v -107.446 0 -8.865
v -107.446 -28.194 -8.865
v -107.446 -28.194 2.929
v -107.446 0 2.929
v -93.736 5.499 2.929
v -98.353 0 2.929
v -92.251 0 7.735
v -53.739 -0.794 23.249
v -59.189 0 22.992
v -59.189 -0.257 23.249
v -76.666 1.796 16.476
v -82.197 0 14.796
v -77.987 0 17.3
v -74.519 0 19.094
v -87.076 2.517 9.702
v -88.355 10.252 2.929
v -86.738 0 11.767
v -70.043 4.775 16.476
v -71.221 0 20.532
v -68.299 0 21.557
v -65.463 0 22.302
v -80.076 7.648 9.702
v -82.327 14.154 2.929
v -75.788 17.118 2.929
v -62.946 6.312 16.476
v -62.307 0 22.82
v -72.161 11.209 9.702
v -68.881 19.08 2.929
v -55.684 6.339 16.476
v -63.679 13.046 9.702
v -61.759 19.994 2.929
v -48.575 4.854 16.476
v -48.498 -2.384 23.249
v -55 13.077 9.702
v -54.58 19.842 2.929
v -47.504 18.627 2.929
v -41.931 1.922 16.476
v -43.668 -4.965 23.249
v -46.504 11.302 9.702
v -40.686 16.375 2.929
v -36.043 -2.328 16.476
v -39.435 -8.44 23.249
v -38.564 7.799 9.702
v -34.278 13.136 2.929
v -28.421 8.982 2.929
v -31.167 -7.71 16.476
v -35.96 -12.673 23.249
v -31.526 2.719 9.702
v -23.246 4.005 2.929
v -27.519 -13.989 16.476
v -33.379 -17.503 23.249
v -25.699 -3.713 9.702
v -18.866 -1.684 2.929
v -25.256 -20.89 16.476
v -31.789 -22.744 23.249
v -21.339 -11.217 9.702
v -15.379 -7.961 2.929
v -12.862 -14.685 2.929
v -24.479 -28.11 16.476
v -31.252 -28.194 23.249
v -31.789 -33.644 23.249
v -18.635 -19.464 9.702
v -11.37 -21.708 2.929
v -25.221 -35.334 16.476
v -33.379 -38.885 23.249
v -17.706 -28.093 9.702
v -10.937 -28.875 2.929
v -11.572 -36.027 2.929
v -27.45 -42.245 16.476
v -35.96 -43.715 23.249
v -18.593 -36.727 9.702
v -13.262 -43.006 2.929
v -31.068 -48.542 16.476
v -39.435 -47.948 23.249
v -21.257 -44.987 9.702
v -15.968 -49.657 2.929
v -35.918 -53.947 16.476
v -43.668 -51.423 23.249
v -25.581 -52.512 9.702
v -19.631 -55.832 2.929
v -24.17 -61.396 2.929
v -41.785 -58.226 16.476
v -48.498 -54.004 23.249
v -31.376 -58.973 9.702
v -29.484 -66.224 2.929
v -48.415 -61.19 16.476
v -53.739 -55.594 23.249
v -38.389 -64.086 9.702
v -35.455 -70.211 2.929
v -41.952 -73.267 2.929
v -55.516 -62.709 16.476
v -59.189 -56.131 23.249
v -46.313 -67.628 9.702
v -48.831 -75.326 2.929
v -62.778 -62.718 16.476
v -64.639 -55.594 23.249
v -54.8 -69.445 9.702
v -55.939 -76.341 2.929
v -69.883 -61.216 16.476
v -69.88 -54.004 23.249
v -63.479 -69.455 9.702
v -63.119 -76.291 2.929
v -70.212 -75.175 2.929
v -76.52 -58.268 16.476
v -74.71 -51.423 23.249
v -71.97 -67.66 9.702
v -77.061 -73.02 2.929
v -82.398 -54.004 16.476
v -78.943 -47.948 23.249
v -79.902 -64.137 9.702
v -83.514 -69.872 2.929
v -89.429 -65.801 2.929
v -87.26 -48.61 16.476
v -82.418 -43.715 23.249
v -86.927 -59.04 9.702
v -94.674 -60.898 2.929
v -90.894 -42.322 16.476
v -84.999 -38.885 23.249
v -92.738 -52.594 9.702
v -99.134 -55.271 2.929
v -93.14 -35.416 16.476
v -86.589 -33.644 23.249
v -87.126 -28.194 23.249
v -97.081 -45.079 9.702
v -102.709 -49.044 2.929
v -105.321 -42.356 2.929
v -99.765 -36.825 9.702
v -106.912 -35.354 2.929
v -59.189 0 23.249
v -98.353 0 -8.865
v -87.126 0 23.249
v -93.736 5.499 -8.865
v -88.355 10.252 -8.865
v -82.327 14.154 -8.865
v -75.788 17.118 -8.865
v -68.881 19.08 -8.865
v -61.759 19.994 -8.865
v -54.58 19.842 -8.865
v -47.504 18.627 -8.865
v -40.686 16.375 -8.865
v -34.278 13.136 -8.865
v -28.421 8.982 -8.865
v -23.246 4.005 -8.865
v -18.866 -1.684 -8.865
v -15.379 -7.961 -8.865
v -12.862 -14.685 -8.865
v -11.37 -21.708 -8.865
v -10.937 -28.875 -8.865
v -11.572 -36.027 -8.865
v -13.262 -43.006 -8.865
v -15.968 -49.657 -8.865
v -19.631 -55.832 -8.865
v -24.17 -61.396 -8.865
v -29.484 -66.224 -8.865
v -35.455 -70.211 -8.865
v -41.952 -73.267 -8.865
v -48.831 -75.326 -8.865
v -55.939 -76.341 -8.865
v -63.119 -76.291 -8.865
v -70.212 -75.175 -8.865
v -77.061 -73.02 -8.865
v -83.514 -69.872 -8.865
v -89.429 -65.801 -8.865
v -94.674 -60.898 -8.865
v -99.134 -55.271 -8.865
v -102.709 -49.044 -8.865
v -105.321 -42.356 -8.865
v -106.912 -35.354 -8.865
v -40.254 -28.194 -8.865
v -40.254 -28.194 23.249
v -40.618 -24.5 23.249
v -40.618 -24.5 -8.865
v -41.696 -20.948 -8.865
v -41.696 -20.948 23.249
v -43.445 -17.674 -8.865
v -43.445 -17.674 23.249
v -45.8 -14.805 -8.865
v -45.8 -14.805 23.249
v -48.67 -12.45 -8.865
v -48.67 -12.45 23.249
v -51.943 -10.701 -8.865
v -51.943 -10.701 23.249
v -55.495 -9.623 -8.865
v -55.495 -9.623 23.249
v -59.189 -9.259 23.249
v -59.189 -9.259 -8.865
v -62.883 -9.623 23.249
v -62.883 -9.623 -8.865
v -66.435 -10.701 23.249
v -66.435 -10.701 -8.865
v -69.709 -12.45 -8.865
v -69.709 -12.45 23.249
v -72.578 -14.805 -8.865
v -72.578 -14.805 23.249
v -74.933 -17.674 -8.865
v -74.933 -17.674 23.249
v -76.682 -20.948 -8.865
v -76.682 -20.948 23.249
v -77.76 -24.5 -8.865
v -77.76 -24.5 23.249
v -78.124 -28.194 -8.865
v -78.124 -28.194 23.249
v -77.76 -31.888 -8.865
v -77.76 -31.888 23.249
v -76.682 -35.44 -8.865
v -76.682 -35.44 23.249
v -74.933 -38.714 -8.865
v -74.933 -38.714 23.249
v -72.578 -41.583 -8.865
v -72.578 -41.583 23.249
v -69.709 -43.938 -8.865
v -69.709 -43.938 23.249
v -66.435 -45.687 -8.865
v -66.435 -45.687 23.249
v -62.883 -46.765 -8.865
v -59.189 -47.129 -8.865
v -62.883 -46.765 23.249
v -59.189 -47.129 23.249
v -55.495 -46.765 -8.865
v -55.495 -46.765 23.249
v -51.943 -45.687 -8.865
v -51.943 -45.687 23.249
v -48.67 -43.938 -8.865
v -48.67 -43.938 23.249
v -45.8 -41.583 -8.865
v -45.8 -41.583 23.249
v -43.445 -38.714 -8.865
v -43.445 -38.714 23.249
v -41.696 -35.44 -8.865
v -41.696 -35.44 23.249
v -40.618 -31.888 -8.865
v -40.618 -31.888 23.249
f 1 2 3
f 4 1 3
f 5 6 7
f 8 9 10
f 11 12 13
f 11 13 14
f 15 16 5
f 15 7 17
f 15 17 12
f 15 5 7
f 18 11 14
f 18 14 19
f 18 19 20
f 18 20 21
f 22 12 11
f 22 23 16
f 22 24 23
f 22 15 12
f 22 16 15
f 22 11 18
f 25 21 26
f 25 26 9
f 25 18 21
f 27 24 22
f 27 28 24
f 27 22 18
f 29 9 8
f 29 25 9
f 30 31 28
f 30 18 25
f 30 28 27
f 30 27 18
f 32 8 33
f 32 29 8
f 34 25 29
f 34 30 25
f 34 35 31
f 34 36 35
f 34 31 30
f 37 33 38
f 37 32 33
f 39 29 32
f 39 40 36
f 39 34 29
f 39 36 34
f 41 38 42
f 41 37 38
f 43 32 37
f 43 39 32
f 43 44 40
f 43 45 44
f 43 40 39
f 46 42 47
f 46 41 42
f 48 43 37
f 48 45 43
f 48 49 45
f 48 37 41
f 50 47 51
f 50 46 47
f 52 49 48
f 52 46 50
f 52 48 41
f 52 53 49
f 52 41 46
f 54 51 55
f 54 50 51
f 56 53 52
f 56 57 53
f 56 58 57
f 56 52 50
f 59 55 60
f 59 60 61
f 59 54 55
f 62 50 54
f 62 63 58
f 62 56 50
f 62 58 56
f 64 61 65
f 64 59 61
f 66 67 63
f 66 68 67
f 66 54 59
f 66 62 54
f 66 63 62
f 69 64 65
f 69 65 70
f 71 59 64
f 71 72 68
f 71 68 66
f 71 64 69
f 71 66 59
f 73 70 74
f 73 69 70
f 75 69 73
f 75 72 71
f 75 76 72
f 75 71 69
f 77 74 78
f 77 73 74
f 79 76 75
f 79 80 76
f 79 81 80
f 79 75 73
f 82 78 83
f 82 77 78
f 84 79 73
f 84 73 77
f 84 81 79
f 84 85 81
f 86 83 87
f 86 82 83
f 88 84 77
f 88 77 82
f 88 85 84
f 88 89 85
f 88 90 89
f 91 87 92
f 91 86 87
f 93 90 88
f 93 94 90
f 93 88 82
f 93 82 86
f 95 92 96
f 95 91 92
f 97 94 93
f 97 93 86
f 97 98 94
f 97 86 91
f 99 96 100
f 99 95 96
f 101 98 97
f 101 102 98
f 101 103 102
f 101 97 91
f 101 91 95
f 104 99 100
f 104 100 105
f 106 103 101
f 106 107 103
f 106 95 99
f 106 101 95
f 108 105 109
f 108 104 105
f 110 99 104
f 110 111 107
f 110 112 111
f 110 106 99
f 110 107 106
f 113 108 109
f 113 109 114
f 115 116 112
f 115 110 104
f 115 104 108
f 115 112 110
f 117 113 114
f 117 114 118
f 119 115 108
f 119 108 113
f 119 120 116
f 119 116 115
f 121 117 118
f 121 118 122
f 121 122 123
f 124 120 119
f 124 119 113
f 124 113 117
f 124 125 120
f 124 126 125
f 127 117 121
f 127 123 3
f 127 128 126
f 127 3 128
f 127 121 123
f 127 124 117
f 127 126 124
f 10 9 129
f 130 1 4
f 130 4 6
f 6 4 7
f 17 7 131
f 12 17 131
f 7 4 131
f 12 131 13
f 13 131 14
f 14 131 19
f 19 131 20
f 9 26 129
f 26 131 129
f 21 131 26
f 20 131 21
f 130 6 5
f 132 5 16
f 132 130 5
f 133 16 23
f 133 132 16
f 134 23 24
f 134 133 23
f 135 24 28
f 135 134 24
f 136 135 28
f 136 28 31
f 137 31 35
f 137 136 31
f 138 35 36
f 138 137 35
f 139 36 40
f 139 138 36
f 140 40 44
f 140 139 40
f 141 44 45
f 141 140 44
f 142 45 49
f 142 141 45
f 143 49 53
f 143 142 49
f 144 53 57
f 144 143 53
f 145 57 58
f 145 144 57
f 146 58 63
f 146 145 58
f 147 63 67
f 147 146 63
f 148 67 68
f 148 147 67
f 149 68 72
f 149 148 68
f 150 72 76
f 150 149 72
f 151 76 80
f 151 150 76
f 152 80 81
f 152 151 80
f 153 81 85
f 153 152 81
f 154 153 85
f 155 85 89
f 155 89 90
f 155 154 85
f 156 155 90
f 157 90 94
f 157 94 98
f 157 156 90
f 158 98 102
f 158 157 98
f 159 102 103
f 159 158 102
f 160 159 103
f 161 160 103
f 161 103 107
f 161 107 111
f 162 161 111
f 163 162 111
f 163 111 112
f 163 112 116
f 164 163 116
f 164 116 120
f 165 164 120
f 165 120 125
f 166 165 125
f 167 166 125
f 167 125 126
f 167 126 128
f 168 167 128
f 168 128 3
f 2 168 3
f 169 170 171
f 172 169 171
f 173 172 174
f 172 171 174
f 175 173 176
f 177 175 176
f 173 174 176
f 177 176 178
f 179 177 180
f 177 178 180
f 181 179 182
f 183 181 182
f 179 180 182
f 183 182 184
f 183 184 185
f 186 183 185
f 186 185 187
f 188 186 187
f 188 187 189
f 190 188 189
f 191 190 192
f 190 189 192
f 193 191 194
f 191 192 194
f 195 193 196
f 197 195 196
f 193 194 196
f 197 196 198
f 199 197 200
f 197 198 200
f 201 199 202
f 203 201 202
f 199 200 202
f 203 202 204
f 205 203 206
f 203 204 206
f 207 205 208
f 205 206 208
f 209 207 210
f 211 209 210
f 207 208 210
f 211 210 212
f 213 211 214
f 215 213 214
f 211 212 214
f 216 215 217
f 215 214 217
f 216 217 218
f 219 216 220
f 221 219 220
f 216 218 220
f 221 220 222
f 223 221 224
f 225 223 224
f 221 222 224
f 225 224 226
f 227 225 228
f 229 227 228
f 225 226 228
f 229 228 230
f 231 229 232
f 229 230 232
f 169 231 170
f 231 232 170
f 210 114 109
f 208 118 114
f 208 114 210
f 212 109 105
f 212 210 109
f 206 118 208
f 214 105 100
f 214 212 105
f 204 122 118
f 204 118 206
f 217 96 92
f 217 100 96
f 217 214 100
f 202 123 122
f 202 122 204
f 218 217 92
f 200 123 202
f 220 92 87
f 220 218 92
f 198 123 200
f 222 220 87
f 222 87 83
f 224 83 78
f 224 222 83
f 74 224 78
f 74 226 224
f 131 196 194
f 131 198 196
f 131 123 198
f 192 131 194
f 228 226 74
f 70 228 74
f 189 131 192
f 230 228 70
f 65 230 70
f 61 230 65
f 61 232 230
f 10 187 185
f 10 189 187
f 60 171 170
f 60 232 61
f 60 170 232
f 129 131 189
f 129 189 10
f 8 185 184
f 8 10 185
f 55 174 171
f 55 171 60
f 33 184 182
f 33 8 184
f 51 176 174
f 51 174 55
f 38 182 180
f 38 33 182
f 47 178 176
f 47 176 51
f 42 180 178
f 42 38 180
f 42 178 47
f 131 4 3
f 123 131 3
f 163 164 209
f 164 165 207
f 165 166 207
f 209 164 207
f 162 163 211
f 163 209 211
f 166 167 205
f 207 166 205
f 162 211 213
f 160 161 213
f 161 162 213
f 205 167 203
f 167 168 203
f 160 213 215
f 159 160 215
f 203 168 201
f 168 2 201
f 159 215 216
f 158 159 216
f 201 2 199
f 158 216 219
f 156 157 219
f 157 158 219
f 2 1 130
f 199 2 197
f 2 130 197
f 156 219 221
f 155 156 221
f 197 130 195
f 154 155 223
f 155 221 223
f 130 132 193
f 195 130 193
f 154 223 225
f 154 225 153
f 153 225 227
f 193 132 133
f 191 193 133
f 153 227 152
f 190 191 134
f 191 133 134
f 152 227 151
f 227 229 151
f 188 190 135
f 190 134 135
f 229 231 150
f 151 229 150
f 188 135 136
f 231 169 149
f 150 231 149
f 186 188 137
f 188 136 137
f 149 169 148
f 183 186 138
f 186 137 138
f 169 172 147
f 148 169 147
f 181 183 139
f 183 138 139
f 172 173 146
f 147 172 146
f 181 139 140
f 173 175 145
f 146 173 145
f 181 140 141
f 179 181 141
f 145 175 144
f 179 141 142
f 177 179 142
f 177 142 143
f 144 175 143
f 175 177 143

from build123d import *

# Parameters (mm, degrees)
F0_W     = 48.2568442822
F0_H     = 32.1138165891
F1_DEPTH = 28.194
F2_SIZE  = 20.32
F4_R     = 18.934689064
F5_DEPTH = 32.1138165891


with BuildPart() as f1:
    # F0 (on Front) → F1 (new body)
    with BuildSketch(Plane.XZ):
        with Locations((-83.3175331354, 7.1921925992)):
            Rectangle(F0_W, F0_H)
    extrude(amount=F1_DEPTH)

    # F2
    f2_edges = [f1.edges().sort_by_distance(p)[0] for p in [
        (-107.445955, -14.097, 23.249101),
    ]]
    chamfer(f2_edges, length=F2_SIZE)

    # F1_face (on face) → F3 (revolve)
    with BuildSketch(Plane(origin=(-80.6501580531, -28.194, 5.7653617255), x_dir=(1, 0, 0), z_dir=(0, -1, 0))):
        Polygon((21.4610470587, 17.4837391683), (-6.4757972234, 17.4837391683), (-26.7957972234, -2.8362608317), (-26.7957972234, -14.6300774209), (21.4610470587, -14.6300774209), align=None)
    revolve(axis=Axis((-59.1891109943, -28.194, 7.1921925992), (0, 0, -1)))

    # F4 (on face) → F5 (cut, through all)
    with BuildSketch(Plane.XY.offset(23.2491008937)):
        with Locations((-59.1891109943, -28.194)):
            Circle(F4_R)
    extrude(amount=-F5_DEPTH, mode=Mode.SUBTRACT)


solid = f1.part
